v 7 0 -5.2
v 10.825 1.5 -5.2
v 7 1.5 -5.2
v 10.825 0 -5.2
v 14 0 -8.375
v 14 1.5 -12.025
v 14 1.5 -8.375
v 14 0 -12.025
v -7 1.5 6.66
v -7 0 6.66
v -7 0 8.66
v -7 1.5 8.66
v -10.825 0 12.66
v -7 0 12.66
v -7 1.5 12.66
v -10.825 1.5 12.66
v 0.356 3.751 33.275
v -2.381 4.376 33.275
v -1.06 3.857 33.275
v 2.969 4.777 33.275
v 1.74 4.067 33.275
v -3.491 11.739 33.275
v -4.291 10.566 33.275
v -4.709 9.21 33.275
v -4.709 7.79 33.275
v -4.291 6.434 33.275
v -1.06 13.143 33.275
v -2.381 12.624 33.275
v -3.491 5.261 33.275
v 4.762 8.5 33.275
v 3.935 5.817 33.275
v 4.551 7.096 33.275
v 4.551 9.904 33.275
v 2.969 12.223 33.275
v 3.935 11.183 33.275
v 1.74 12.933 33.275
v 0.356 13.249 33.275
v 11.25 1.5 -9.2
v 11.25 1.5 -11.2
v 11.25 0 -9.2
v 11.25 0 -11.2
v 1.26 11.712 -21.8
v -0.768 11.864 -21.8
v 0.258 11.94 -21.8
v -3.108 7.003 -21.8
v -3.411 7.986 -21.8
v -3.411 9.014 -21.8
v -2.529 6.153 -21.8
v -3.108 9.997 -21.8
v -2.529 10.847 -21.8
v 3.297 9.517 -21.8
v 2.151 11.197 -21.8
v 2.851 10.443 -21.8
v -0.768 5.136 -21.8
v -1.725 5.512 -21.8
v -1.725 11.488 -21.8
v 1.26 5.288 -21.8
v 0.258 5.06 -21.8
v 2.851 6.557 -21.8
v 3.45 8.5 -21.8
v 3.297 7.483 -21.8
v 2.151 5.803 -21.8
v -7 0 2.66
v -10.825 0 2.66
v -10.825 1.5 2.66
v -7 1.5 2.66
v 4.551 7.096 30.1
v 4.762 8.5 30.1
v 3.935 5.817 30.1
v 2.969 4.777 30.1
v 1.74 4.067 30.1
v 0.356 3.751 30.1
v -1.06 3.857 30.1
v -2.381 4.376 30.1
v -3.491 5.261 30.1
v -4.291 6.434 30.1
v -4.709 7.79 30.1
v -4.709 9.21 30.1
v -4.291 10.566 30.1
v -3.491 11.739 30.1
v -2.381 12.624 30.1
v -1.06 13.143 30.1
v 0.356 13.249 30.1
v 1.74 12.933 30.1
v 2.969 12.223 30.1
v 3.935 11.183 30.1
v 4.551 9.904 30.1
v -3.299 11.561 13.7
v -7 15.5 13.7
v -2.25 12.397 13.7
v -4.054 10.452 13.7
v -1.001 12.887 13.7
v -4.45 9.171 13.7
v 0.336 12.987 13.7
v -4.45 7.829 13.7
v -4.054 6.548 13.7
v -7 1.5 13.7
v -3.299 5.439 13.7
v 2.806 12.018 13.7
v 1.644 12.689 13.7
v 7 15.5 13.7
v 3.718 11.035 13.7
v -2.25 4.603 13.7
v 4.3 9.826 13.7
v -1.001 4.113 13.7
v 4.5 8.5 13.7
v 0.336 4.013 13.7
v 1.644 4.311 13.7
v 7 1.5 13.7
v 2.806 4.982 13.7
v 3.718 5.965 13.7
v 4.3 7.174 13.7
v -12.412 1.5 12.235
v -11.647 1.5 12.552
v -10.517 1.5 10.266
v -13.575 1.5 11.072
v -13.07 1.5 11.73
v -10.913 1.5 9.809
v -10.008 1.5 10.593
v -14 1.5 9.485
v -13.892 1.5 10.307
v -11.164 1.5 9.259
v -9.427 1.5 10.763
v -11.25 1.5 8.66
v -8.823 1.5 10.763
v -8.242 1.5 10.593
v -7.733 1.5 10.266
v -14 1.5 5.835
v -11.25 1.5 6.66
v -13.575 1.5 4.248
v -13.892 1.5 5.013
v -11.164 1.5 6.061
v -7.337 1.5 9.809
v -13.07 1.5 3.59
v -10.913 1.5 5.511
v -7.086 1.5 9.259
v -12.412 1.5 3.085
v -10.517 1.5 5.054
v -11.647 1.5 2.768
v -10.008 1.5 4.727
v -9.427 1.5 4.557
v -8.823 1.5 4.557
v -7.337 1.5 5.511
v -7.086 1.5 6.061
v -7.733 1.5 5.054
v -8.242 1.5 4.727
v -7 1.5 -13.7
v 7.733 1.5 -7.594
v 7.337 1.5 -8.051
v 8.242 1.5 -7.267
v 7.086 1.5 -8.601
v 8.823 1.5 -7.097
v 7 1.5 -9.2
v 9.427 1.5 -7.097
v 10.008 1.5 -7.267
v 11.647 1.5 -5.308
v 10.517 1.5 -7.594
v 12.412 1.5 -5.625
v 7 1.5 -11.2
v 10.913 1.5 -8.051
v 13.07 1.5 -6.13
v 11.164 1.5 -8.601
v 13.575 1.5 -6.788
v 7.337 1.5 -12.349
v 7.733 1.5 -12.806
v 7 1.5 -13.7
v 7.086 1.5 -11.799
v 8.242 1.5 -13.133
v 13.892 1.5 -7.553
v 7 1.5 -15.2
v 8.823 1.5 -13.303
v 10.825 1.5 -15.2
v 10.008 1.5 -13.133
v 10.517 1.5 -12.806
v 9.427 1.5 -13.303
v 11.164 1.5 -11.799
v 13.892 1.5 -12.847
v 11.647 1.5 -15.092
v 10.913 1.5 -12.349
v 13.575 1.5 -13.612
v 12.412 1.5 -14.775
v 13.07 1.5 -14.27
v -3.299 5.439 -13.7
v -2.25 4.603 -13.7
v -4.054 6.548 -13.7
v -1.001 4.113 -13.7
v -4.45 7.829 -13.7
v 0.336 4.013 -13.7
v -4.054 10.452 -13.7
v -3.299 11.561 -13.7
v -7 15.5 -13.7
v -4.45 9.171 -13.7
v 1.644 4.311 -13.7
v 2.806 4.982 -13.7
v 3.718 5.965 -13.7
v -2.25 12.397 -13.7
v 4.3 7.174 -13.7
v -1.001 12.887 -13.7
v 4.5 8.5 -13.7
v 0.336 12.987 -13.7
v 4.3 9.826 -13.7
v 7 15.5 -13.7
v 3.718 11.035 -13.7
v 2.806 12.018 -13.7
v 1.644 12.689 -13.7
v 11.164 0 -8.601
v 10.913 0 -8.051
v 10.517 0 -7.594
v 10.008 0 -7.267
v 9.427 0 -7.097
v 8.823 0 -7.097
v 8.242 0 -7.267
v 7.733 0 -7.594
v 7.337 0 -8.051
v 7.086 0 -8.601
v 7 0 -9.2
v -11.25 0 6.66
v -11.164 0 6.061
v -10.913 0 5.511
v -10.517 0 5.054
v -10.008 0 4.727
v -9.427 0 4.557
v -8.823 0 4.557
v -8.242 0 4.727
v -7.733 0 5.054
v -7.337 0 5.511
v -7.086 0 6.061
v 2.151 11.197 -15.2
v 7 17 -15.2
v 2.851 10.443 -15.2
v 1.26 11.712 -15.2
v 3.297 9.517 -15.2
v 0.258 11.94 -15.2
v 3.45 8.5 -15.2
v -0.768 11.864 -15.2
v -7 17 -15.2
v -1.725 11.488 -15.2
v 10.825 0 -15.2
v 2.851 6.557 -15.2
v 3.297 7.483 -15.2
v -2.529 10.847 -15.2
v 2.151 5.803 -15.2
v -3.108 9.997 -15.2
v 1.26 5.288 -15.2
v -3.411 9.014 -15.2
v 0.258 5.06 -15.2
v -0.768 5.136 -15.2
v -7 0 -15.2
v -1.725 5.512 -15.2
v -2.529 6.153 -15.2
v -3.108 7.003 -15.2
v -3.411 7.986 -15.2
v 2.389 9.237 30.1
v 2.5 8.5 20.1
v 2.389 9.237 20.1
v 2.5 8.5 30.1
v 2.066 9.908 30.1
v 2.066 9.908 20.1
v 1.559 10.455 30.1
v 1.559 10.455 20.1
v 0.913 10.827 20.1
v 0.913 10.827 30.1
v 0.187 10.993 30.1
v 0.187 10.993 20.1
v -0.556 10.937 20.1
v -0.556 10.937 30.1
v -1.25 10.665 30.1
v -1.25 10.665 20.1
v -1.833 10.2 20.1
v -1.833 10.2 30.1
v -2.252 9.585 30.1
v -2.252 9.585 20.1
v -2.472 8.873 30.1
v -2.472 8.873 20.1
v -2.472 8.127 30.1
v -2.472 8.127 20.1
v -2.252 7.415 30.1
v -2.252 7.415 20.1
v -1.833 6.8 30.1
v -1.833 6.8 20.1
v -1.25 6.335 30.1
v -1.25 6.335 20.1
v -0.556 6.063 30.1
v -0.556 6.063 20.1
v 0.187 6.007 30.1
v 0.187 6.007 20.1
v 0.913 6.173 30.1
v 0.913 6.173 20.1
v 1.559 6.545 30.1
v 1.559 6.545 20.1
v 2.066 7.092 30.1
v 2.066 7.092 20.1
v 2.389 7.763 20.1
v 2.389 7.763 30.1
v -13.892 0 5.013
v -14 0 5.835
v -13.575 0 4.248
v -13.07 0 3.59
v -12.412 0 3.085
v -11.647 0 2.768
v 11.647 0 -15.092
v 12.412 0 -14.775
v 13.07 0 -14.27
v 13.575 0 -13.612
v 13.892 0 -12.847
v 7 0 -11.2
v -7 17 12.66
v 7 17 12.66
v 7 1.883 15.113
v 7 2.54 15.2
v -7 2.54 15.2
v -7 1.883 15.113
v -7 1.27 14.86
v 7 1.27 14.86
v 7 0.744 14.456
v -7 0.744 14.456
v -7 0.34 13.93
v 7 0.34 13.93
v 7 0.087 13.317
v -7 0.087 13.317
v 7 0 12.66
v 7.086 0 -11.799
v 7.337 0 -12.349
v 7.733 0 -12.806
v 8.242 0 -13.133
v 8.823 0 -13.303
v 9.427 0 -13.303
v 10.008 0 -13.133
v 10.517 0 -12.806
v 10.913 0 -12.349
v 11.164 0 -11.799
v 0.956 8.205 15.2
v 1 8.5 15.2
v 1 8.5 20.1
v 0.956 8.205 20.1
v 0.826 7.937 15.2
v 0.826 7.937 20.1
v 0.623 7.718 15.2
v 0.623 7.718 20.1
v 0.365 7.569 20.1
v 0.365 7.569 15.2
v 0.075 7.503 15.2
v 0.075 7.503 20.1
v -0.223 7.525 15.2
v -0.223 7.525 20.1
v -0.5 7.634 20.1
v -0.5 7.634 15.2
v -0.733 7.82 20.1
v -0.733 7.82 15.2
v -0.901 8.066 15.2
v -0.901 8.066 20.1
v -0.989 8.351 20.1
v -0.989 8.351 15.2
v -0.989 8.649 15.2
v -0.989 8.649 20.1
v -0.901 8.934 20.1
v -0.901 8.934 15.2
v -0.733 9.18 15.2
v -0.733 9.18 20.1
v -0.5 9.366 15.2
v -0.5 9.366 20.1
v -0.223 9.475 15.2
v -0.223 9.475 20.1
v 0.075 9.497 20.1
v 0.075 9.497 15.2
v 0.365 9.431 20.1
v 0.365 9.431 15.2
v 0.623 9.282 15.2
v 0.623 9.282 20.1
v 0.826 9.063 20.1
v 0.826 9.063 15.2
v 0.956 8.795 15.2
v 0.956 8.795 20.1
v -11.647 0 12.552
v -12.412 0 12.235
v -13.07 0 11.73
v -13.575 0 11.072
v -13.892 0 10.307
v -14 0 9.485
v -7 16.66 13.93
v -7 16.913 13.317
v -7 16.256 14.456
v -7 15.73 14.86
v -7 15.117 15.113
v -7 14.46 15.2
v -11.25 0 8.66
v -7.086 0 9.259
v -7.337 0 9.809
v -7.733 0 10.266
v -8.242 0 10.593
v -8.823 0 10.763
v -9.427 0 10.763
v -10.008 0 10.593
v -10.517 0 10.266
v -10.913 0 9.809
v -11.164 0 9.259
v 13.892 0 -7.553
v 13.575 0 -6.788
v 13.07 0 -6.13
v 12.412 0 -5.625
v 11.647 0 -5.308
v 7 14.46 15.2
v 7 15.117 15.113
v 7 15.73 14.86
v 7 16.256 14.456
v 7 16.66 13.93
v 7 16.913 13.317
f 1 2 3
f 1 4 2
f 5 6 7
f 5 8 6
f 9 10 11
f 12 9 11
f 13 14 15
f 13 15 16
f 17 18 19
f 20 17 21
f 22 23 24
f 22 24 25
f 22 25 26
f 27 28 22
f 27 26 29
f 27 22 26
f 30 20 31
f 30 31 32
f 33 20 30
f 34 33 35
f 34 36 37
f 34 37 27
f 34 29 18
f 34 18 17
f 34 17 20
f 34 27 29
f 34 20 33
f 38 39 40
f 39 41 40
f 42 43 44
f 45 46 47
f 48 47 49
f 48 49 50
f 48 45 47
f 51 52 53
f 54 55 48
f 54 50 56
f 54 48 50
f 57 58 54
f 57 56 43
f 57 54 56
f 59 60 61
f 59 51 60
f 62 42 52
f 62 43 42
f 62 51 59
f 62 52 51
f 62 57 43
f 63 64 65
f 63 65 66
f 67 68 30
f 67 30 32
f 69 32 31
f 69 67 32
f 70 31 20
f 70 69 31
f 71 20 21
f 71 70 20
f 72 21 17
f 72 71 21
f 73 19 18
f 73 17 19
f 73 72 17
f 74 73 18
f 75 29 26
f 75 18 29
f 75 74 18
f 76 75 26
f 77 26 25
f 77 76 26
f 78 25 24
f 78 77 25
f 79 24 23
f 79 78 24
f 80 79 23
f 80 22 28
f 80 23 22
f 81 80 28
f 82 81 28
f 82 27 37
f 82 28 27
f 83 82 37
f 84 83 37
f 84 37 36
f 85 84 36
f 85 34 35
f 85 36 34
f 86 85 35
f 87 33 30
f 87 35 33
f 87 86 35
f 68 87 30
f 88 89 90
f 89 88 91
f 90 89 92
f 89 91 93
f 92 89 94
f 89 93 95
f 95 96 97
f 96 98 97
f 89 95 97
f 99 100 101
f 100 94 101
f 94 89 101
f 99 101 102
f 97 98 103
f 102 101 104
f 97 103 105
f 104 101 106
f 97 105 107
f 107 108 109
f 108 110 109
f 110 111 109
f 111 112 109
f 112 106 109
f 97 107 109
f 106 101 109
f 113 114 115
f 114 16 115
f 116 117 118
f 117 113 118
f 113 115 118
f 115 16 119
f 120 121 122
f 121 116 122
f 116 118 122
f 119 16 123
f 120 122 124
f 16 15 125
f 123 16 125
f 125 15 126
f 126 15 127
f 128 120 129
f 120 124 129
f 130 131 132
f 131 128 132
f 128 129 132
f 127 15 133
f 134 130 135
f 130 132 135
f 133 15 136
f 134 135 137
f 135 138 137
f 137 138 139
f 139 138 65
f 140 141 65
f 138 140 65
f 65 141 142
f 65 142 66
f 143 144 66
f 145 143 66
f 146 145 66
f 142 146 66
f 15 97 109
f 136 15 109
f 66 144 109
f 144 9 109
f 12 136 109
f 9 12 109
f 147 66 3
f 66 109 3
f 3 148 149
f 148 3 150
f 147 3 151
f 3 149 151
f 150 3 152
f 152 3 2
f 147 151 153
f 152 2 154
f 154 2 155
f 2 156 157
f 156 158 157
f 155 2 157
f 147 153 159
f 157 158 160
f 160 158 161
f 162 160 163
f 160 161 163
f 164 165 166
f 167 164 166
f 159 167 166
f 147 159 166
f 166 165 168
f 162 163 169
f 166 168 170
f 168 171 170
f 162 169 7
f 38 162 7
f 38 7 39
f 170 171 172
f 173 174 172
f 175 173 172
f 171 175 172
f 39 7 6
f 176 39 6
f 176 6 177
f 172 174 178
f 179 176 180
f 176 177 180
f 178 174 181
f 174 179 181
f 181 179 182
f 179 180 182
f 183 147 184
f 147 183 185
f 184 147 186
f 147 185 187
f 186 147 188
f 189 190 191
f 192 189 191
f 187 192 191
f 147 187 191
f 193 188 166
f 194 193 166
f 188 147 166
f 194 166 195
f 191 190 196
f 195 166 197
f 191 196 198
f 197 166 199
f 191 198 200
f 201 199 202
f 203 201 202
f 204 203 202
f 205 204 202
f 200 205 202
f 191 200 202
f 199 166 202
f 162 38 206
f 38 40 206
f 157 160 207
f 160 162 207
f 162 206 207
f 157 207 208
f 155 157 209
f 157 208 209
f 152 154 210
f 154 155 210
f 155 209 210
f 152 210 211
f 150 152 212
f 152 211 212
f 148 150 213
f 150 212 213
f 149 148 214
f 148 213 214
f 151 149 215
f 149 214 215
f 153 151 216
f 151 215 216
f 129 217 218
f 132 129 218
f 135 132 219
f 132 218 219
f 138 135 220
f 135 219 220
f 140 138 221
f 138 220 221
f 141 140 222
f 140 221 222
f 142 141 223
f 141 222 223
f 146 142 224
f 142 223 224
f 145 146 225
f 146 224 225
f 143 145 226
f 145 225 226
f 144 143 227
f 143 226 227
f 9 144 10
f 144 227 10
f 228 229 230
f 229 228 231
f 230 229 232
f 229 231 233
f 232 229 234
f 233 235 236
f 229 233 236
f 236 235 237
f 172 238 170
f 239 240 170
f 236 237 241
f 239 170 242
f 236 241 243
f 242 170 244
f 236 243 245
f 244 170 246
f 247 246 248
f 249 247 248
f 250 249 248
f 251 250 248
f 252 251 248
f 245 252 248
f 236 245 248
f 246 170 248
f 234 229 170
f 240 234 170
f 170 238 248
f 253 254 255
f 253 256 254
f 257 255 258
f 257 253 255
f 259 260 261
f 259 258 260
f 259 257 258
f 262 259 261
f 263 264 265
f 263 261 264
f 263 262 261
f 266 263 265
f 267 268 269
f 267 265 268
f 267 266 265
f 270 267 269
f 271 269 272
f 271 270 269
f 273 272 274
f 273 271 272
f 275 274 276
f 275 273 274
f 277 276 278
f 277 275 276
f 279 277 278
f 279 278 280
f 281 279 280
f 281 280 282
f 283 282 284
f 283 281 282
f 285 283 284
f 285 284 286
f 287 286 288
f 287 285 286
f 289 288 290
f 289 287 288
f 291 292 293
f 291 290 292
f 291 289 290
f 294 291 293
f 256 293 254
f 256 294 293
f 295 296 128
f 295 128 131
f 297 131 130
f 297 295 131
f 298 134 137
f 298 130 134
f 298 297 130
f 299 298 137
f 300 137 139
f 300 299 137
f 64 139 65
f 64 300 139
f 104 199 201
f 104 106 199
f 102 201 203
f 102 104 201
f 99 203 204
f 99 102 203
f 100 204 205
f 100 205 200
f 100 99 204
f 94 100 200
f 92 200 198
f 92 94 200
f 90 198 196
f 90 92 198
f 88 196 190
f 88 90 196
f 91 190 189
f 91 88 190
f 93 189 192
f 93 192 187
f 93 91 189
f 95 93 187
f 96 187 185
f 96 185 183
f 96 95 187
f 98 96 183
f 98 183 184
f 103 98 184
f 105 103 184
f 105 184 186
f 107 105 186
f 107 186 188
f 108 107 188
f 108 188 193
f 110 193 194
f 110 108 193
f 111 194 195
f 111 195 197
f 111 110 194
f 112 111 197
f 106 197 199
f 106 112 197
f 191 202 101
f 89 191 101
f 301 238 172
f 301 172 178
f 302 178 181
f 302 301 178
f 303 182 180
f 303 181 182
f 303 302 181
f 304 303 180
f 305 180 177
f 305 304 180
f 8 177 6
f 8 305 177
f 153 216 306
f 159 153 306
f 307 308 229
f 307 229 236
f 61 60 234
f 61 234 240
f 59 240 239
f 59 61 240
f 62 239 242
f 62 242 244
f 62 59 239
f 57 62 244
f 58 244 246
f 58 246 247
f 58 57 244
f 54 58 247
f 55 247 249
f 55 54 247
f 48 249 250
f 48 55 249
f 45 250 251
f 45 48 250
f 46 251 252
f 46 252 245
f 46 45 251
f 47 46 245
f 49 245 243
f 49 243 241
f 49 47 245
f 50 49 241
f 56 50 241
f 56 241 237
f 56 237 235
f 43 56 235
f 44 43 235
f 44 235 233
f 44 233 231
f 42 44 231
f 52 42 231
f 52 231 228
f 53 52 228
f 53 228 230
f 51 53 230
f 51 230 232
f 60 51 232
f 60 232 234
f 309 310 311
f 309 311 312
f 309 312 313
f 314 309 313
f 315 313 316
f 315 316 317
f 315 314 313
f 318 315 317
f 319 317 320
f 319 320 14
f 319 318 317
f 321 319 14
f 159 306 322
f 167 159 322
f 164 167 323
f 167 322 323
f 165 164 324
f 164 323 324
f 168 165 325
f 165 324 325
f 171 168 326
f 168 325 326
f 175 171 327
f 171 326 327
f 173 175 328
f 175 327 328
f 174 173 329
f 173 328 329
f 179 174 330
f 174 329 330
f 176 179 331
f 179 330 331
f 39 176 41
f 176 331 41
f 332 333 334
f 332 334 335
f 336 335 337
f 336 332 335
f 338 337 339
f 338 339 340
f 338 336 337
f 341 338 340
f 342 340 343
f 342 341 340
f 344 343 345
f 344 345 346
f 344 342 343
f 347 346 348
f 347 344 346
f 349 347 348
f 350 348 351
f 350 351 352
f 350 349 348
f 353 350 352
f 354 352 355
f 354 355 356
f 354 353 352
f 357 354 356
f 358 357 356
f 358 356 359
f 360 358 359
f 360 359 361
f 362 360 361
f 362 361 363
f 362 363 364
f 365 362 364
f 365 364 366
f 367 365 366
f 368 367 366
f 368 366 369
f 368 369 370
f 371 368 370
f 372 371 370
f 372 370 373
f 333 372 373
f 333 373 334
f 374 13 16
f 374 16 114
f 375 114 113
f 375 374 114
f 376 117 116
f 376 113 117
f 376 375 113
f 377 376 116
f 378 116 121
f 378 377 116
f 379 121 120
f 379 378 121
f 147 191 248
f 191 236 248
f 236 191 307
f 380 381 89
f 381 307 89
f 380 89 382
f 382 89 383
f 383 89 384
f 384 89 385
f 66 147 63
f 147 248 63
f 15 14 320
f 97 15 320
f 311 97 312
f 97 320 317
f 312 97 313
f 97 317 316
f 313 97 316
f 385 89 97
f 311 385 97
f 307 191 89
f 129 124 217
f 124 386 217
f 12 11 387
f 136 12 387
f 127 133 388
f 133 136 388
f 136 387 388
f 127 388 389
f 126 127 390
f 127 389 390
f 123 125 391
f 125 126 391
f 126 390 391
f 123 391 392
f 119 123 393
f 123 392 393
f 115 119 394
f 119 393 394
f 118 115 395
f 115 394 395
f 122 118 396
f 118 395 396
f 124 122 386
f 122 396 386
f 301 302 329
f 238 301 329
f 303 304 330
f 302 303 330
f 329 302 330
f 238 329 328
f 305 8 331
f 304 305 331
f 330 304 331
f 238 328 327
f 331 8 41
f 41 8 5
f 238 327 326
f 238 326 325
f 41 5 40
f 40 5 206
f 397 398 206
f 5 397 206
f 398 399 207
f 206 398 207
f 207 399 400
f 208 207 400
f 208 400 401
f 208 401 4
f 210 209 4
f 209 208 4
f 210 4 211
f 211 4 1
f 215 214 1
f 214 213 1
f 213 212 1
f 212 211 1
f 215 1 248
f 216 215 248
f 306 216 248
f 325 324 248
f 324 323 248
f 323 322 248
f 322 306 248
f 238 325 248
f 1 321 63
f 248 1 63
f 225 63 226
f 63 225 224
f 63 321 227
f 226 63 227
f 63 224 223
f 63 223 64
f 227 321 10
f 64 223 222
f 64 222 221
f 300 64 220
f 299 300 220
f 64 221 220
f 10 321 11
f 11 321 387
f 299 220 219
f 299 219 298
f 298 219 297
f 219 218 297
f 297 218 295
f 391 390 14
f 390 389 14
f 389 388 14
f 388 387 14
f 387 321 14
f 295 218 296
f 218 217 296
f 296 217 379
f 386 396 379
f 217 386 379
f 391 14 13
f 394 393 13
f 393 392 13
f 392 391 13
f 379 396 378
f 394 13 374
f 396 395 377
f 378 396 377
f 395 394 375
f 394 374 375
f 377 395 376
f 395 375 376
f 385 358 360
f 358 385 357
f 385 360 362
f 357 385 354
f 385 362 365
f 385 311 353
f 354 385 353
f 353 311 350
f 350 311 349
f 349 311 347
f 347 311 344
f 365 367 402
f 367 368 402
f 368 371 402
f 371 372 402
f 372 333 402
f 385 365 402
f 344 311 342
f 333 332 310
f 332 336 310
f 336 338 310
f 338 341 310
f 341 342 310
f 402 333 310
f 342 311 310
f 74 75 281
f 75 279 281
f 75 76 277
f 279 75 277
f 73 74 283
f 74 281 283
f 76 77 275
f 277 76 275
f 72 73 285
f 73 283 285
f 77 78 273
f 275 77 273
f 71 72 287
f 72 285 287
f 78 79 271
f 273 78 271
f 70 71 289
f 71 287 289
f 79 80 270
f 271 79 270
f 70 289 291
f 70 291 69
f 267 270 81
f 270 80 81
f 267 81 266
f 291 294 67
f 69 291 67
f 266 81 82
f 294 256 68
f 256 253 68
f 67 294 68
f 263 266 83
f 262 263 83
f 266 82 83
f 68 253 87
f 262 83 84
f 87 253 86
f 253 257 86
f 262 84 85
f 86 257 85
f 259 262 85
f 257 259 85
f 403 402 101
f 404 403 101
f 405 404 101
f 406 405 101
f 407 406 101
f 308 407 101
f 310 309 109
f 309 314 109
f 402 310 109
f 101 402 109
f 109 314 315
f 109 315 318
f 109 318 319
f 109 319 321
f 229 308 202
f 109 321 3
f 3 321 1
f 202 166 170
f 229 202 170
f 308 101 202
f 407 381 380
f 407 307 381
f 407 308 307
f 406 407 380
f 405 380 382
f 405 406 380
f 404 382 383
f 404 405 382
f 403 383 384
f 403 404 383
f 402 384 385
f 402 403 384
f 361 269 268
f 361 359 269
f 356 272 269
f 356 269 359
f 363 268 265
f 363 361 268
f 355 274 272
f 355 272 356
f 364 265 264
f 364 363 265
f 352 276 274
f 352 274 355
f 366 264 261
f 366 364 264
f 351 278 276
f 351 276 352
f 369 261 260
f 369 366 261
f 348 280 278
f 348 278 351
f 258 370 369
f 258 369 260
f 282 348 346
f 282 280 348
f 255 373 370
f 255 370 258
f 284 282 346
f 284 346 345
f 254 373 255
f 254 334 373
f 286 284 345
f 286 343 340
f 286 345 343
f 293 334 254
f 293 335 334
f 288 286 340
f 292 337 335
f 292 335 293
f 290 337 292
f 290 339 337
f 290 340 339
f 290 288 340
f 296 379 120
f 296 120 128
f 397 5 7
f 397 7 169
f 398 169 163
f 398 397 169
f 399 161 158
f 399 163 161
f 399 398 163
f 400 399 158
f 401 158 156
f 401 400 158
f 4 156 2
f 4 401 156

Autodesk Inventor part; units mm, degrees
ref_plane "YZ Plane" through (0, 0, 0) normal (1, 0, 0) x (0, 1, 0)
ref_plane "XZ Plane" through (0, 0, 0) normal (0, 1, 0) x (-1, 0, 0)
sketch "Sketch1" plane through (0, 0, 0) normal (0, 1, 0) x (-1, 0, 0)
  line L0 (7, 15.2) -> (-7, 15.2)
  line L1 (-7, 15.2) -> (-7, -15.2)
  line L2 (-7, -15.2) -> (7, -15.2)
  line L3 (7, -15.2) -> (7, 15.2)
  point P0 (0, 0)
  dimension "d0" = 30.4
  dimension "d1" = 14
  dimension "d2" = 7
  dimension "d3" = 15.2
extrude "Extrusion1" add sketch "Sketch1" along normal blind 17
fillet "Fillet1" radius 2.54 2 edges at (0, 17, 15.2) (0, 0, 15.2)
sketch "Sketch2" plane through (7, 0, -15.2) normal (1, 0, 0) x (0, 0, -1)
  line L0 (-1.5, 15.5) -> (-28.9, 15.5)
  line L1 (-28.9, 15.5) -> (-28.9, 1.5)
  line L2 (-28.9, 1.5) -> (-1.5, 1.5)
  line L3 (-1.5, 1.5) -> (-1.5, 15.5)
  line L4 (-28.9, 8.5) -> (-30.4, 8.5) construction
  line L5 (-30.4, 2.54) -> (-30.4, 14.46) projected
  line L6 (-1.5, 9.1916) -> (0, 9.1916) construction
  line L7 (0, 0) -> (0, 17) projected
  line L8 (-13.3503, 1.5) -> (-13.3503, 0) construction
  line L9 (-15.2, 15.5) -> (-15.2, 17) construction
  line L10 (0, 17) -> (-27.86, 17) projected
  line L11 (-27.86, 0) -> (0, 0) projected
  point P0 (-15.2, 0)
  dimension "d7" = 1.5
extrude "Extrusion2" cut sketch "Sketch2" against normal blind 17
ref_plane "Work Plane1" through (0, 8.5, 0) normal (0, 1, 0) x (1, 0, 0)
sketch "Sketch4" plane through (0, 17, 0) normal (0, 1, 0) x (1, 0, 0)
  line L0 (7, 15.2) -> (-7, 15.2) projected
  line L1 (0, 15.2) -> (3.45, 15.2)
  line L2 (3.45, 15.2) -> (3.45, 21.8)
  line L3 (3.45, 21.8) -> (0, 21.8)
  line L4 (0, 21.8) -> (0, 15.2)
  line L5 (-7, -15.2) -> (7, -15.2) projected
  line L6 (0, 15.2) -> (4.5, 15.2)
  line L7 (4.5, 15.2) -> (4.5, -15.2)
  line L8 (4.5, -15.2) -> (0, -15.2)
  line L9 (0, -15.2) -> (0, 15.2)
  line L10 (1, -15.2) -> (0, -15.2)
  line L11 (0, -15.2) -> (0, -20.1)
  line L12 (0, -20.1) -> (1, -20.1)
  line L13 (1, -20.1) -> (1, -15.2)
  line L14 (0, -20.1) -> (2.5, -20.1)
  line L15 (2.5, -20.1) -> (2.5, -30.1)
  line L16 (2.5, -30.1) -> (0, -30.1)
  line L17 (0, -30.1) -> (0, -20.1)
  point P0 (0, 0)
  dimension "d10" = 3.45
  dimension "d11" = 51.9
  dimension "d12" = 10
  dimension "d14" = 4.9
  dimension "d15" = 2.5
  dimension "d16" = 1
  dimension "d17" = 4.5
sketch "Sketch5" plane through (0, 8.5, 0) normal (0, 1, 0) x (1, 0, 0)
  line L0 (0, 15.2) -> (3.45, 15.2)
  line L1 (3.45, 15.2) -> (3.45, 21.8)
  line L2 (3.45, 21.8) -> (0, 21.8)
  line L3 (0, 21.8) -> (0, 15.2)
  line L4 (0, 15.2) -> (4.5, 15.2)
  line L5 (4.5, 15.2) -> (4.5, -15.2)
  line L6 (4.5, -15.2) -> (0, -15.2)
  line L7 (0, -15.2) -> (0, 15.2)
  line L8 (1, -15.2) -> (0, -15.2)
  line L9 (0, -15.2) -> (0, -20.1)
  line L10 (0, -20.1) -> (1, -20.1)
  line L11 (1, -20.1) -> (1, -15.2)
  line L12 (0, -20.1) -> (2.5, -20.1)
  line L13 (2.5, -20.1) -> (2.5, -30.1)
  line L14 (2.5, -30.1) -> (0, -30.1)
  line L15 (0, -30.1) -> (0, -20.1)
  point P0 (0, 0)
  dimension "d18" = 3.45
  dimension "d19" = 51.9
  dimension "d20" = 10
  dimension "d21" = 4.9
  dimension "d22" = 2.5
  dimension "d23" = 1
  dimension "d24" = 4.5
revolve "Revolution1" add sketch "Sketch5" angle 360 about axis through (0, 8.5, 30.1) along (0, 0, -1)
sketch "Sketch6" plane through (0, 0, 0) normal (0, 1, 0) x (-1, 0, 0)
  line L0 (-7, -15.2) -> (7, -15.2) projected
  line L1 (-7, 12.66) -> (7, 12.66) projected
  line L2 (7, 12.66) -> (10.825, 12.66)
  line L3 (14, 9.485) -> (14, 5.835)
  line L4 (10.825, 2.66) -> (7, 2.66)
  line L5 (7, 2.66) -> (7, 12.66)
  line L6 (11.25, 6.66) -> (7, 6.66)
  line L7 (7, 6.66) -> (7, 8.66)
  line L8 (7, 8.66) -> (11.25, 8.66)
  line L9 (11.25, 8.66) -> (11.25, 6.66)
  line L10 (7, -15.2) -> (7, 12.66) projected
  line L11 (7, 7.66) -> (14, 7.66) construction
  circle A0 centre (9.125, 6.66) radius 2.125
  circle A1 centre (9.125, 8.66) radius 2.125
  arc A2 (10.825, 2.66) -> (14, 5.835) centre (10.825, 5.835) ccw
  arc A3 (14, 9.485) -> (10.825, 12.66) centre (10.825, 9.485) ccw
  line L12 (-1, 15.2) -> (1, 15.2) projected
  line L13 (7, -15.2) -> (7, 12.66) projected
  line L14 (7, 12.66) -> (7, -15.2)
  line L15 (7, -1.27) -> (-7, -1.27) construction
  line L16 (-7, -13.7) -> (-7, 13.7) projected
  line L17 (0, -1.27) -> (0, -15.2) construction
  line L18 (7, -15.2) -> (10.825, -15.2) construction
  line L19 (14, -12.025) -> (14, -8.375) construction
  line L20 (10.825, -5.2) -> (7, -5.2) construction
  line L21 (7, -5.2) -> (7, -15.2) construction
  line L22 (11.25, -9.2) -> (7, -9.2) construction
  line L23 (7, -9.2) -> (7, -11.2) construction
  line L24 (7, -11.2) -> (11.25, -11.2) construction
  line L25 (11.25, -11.2) -> (11.25, -9.2) construction
  line L26 (7, -10.2) -> (14, -10.2) construction
  circle A4 centre (9.125, -9.2) radius 2.125 construction
  circle A5 centre (9.125, -11.2) radius 2.125 construction
  arc A6 (14, -8.375) -> (10.825, -5.2) centre (10.825, -8.375) ccw construction
  arc A7 (10.825, -15.2) -> (14, -12.025) centre (10.825, -12.025) ccw construction
  line L27 (-7, -5.2) -> (-7, -15.2)
  line L28 (-7, -9.2) -> (-7, -11.2)
  line L29 (-7, -15.2) -> (-10.825, -15.2)
  line L30 (-7, -11.2) -> (-11.25, -11.2)
  line L31 (-11.25, -9.2) -> (-7, -9.2)
  line L32 (-11.25, -11.2) -> (-11.25, -9.2)
  circle A8 centre (-9.125, -11.2) radius 2.125
  circle A9 centre (-9.125, -9.2) radius 2.125
  arc A10 (-14, -12.025) -> (-10.825, -15.2) centre (-10.825, -12.025) ccw
  line L33 (-10.825, -5.2) -> (-7, -5.2)
  line L34 (-7, -10.2) -> (-14, -10.2) construction
  line L35 (-14, -12.025) -> (-14, -8.375)
  arc A11 (-10.825, -5.2) -> (-14, -8.375) centre (-10.825, -8.375) ccw
  point P0 (14, 2.66)
  point P1 (14, 12.66)
  point P2 (14, -5.2)
  point P3 (14, -15.2)
  point P4 (-14, -15.2)
  point P5 (-14, -5.2)
  dimension "d26" = 4.25
  dimension "d27" = 7
  dimension "d28" = 10
  dimension "d29" = 2
  dimension "d30" = 3.175
extrude "Extrusion3" add sketch "Sketch6" along normal blind 1.5 contours L29 A10 L35 A11 L33 L16 A9 L32 A8 L27 | L5 A0 L9 A1 L2 A3 L3 A2 L4
sketch "Sketch7" plane through (0, 8.5, 30.1) normal (0, 0, 1) x (1, 0, 0)
  circle A0 centre (0, 0) radius 2.5 projected
  circle A1 centre (0, 0) radius 4.7625
  point P0 (0, -8.5)
  dimension "d33" = 9.525
extrude "Extrusion4" add sketch "Sketch7" along normal blind 3.175 contours A0 | A1
equation "\"d2\" = 0.5 * d1"
equation "\"d3\" = 0.5 * d0"
properties part number "Solenoid"
